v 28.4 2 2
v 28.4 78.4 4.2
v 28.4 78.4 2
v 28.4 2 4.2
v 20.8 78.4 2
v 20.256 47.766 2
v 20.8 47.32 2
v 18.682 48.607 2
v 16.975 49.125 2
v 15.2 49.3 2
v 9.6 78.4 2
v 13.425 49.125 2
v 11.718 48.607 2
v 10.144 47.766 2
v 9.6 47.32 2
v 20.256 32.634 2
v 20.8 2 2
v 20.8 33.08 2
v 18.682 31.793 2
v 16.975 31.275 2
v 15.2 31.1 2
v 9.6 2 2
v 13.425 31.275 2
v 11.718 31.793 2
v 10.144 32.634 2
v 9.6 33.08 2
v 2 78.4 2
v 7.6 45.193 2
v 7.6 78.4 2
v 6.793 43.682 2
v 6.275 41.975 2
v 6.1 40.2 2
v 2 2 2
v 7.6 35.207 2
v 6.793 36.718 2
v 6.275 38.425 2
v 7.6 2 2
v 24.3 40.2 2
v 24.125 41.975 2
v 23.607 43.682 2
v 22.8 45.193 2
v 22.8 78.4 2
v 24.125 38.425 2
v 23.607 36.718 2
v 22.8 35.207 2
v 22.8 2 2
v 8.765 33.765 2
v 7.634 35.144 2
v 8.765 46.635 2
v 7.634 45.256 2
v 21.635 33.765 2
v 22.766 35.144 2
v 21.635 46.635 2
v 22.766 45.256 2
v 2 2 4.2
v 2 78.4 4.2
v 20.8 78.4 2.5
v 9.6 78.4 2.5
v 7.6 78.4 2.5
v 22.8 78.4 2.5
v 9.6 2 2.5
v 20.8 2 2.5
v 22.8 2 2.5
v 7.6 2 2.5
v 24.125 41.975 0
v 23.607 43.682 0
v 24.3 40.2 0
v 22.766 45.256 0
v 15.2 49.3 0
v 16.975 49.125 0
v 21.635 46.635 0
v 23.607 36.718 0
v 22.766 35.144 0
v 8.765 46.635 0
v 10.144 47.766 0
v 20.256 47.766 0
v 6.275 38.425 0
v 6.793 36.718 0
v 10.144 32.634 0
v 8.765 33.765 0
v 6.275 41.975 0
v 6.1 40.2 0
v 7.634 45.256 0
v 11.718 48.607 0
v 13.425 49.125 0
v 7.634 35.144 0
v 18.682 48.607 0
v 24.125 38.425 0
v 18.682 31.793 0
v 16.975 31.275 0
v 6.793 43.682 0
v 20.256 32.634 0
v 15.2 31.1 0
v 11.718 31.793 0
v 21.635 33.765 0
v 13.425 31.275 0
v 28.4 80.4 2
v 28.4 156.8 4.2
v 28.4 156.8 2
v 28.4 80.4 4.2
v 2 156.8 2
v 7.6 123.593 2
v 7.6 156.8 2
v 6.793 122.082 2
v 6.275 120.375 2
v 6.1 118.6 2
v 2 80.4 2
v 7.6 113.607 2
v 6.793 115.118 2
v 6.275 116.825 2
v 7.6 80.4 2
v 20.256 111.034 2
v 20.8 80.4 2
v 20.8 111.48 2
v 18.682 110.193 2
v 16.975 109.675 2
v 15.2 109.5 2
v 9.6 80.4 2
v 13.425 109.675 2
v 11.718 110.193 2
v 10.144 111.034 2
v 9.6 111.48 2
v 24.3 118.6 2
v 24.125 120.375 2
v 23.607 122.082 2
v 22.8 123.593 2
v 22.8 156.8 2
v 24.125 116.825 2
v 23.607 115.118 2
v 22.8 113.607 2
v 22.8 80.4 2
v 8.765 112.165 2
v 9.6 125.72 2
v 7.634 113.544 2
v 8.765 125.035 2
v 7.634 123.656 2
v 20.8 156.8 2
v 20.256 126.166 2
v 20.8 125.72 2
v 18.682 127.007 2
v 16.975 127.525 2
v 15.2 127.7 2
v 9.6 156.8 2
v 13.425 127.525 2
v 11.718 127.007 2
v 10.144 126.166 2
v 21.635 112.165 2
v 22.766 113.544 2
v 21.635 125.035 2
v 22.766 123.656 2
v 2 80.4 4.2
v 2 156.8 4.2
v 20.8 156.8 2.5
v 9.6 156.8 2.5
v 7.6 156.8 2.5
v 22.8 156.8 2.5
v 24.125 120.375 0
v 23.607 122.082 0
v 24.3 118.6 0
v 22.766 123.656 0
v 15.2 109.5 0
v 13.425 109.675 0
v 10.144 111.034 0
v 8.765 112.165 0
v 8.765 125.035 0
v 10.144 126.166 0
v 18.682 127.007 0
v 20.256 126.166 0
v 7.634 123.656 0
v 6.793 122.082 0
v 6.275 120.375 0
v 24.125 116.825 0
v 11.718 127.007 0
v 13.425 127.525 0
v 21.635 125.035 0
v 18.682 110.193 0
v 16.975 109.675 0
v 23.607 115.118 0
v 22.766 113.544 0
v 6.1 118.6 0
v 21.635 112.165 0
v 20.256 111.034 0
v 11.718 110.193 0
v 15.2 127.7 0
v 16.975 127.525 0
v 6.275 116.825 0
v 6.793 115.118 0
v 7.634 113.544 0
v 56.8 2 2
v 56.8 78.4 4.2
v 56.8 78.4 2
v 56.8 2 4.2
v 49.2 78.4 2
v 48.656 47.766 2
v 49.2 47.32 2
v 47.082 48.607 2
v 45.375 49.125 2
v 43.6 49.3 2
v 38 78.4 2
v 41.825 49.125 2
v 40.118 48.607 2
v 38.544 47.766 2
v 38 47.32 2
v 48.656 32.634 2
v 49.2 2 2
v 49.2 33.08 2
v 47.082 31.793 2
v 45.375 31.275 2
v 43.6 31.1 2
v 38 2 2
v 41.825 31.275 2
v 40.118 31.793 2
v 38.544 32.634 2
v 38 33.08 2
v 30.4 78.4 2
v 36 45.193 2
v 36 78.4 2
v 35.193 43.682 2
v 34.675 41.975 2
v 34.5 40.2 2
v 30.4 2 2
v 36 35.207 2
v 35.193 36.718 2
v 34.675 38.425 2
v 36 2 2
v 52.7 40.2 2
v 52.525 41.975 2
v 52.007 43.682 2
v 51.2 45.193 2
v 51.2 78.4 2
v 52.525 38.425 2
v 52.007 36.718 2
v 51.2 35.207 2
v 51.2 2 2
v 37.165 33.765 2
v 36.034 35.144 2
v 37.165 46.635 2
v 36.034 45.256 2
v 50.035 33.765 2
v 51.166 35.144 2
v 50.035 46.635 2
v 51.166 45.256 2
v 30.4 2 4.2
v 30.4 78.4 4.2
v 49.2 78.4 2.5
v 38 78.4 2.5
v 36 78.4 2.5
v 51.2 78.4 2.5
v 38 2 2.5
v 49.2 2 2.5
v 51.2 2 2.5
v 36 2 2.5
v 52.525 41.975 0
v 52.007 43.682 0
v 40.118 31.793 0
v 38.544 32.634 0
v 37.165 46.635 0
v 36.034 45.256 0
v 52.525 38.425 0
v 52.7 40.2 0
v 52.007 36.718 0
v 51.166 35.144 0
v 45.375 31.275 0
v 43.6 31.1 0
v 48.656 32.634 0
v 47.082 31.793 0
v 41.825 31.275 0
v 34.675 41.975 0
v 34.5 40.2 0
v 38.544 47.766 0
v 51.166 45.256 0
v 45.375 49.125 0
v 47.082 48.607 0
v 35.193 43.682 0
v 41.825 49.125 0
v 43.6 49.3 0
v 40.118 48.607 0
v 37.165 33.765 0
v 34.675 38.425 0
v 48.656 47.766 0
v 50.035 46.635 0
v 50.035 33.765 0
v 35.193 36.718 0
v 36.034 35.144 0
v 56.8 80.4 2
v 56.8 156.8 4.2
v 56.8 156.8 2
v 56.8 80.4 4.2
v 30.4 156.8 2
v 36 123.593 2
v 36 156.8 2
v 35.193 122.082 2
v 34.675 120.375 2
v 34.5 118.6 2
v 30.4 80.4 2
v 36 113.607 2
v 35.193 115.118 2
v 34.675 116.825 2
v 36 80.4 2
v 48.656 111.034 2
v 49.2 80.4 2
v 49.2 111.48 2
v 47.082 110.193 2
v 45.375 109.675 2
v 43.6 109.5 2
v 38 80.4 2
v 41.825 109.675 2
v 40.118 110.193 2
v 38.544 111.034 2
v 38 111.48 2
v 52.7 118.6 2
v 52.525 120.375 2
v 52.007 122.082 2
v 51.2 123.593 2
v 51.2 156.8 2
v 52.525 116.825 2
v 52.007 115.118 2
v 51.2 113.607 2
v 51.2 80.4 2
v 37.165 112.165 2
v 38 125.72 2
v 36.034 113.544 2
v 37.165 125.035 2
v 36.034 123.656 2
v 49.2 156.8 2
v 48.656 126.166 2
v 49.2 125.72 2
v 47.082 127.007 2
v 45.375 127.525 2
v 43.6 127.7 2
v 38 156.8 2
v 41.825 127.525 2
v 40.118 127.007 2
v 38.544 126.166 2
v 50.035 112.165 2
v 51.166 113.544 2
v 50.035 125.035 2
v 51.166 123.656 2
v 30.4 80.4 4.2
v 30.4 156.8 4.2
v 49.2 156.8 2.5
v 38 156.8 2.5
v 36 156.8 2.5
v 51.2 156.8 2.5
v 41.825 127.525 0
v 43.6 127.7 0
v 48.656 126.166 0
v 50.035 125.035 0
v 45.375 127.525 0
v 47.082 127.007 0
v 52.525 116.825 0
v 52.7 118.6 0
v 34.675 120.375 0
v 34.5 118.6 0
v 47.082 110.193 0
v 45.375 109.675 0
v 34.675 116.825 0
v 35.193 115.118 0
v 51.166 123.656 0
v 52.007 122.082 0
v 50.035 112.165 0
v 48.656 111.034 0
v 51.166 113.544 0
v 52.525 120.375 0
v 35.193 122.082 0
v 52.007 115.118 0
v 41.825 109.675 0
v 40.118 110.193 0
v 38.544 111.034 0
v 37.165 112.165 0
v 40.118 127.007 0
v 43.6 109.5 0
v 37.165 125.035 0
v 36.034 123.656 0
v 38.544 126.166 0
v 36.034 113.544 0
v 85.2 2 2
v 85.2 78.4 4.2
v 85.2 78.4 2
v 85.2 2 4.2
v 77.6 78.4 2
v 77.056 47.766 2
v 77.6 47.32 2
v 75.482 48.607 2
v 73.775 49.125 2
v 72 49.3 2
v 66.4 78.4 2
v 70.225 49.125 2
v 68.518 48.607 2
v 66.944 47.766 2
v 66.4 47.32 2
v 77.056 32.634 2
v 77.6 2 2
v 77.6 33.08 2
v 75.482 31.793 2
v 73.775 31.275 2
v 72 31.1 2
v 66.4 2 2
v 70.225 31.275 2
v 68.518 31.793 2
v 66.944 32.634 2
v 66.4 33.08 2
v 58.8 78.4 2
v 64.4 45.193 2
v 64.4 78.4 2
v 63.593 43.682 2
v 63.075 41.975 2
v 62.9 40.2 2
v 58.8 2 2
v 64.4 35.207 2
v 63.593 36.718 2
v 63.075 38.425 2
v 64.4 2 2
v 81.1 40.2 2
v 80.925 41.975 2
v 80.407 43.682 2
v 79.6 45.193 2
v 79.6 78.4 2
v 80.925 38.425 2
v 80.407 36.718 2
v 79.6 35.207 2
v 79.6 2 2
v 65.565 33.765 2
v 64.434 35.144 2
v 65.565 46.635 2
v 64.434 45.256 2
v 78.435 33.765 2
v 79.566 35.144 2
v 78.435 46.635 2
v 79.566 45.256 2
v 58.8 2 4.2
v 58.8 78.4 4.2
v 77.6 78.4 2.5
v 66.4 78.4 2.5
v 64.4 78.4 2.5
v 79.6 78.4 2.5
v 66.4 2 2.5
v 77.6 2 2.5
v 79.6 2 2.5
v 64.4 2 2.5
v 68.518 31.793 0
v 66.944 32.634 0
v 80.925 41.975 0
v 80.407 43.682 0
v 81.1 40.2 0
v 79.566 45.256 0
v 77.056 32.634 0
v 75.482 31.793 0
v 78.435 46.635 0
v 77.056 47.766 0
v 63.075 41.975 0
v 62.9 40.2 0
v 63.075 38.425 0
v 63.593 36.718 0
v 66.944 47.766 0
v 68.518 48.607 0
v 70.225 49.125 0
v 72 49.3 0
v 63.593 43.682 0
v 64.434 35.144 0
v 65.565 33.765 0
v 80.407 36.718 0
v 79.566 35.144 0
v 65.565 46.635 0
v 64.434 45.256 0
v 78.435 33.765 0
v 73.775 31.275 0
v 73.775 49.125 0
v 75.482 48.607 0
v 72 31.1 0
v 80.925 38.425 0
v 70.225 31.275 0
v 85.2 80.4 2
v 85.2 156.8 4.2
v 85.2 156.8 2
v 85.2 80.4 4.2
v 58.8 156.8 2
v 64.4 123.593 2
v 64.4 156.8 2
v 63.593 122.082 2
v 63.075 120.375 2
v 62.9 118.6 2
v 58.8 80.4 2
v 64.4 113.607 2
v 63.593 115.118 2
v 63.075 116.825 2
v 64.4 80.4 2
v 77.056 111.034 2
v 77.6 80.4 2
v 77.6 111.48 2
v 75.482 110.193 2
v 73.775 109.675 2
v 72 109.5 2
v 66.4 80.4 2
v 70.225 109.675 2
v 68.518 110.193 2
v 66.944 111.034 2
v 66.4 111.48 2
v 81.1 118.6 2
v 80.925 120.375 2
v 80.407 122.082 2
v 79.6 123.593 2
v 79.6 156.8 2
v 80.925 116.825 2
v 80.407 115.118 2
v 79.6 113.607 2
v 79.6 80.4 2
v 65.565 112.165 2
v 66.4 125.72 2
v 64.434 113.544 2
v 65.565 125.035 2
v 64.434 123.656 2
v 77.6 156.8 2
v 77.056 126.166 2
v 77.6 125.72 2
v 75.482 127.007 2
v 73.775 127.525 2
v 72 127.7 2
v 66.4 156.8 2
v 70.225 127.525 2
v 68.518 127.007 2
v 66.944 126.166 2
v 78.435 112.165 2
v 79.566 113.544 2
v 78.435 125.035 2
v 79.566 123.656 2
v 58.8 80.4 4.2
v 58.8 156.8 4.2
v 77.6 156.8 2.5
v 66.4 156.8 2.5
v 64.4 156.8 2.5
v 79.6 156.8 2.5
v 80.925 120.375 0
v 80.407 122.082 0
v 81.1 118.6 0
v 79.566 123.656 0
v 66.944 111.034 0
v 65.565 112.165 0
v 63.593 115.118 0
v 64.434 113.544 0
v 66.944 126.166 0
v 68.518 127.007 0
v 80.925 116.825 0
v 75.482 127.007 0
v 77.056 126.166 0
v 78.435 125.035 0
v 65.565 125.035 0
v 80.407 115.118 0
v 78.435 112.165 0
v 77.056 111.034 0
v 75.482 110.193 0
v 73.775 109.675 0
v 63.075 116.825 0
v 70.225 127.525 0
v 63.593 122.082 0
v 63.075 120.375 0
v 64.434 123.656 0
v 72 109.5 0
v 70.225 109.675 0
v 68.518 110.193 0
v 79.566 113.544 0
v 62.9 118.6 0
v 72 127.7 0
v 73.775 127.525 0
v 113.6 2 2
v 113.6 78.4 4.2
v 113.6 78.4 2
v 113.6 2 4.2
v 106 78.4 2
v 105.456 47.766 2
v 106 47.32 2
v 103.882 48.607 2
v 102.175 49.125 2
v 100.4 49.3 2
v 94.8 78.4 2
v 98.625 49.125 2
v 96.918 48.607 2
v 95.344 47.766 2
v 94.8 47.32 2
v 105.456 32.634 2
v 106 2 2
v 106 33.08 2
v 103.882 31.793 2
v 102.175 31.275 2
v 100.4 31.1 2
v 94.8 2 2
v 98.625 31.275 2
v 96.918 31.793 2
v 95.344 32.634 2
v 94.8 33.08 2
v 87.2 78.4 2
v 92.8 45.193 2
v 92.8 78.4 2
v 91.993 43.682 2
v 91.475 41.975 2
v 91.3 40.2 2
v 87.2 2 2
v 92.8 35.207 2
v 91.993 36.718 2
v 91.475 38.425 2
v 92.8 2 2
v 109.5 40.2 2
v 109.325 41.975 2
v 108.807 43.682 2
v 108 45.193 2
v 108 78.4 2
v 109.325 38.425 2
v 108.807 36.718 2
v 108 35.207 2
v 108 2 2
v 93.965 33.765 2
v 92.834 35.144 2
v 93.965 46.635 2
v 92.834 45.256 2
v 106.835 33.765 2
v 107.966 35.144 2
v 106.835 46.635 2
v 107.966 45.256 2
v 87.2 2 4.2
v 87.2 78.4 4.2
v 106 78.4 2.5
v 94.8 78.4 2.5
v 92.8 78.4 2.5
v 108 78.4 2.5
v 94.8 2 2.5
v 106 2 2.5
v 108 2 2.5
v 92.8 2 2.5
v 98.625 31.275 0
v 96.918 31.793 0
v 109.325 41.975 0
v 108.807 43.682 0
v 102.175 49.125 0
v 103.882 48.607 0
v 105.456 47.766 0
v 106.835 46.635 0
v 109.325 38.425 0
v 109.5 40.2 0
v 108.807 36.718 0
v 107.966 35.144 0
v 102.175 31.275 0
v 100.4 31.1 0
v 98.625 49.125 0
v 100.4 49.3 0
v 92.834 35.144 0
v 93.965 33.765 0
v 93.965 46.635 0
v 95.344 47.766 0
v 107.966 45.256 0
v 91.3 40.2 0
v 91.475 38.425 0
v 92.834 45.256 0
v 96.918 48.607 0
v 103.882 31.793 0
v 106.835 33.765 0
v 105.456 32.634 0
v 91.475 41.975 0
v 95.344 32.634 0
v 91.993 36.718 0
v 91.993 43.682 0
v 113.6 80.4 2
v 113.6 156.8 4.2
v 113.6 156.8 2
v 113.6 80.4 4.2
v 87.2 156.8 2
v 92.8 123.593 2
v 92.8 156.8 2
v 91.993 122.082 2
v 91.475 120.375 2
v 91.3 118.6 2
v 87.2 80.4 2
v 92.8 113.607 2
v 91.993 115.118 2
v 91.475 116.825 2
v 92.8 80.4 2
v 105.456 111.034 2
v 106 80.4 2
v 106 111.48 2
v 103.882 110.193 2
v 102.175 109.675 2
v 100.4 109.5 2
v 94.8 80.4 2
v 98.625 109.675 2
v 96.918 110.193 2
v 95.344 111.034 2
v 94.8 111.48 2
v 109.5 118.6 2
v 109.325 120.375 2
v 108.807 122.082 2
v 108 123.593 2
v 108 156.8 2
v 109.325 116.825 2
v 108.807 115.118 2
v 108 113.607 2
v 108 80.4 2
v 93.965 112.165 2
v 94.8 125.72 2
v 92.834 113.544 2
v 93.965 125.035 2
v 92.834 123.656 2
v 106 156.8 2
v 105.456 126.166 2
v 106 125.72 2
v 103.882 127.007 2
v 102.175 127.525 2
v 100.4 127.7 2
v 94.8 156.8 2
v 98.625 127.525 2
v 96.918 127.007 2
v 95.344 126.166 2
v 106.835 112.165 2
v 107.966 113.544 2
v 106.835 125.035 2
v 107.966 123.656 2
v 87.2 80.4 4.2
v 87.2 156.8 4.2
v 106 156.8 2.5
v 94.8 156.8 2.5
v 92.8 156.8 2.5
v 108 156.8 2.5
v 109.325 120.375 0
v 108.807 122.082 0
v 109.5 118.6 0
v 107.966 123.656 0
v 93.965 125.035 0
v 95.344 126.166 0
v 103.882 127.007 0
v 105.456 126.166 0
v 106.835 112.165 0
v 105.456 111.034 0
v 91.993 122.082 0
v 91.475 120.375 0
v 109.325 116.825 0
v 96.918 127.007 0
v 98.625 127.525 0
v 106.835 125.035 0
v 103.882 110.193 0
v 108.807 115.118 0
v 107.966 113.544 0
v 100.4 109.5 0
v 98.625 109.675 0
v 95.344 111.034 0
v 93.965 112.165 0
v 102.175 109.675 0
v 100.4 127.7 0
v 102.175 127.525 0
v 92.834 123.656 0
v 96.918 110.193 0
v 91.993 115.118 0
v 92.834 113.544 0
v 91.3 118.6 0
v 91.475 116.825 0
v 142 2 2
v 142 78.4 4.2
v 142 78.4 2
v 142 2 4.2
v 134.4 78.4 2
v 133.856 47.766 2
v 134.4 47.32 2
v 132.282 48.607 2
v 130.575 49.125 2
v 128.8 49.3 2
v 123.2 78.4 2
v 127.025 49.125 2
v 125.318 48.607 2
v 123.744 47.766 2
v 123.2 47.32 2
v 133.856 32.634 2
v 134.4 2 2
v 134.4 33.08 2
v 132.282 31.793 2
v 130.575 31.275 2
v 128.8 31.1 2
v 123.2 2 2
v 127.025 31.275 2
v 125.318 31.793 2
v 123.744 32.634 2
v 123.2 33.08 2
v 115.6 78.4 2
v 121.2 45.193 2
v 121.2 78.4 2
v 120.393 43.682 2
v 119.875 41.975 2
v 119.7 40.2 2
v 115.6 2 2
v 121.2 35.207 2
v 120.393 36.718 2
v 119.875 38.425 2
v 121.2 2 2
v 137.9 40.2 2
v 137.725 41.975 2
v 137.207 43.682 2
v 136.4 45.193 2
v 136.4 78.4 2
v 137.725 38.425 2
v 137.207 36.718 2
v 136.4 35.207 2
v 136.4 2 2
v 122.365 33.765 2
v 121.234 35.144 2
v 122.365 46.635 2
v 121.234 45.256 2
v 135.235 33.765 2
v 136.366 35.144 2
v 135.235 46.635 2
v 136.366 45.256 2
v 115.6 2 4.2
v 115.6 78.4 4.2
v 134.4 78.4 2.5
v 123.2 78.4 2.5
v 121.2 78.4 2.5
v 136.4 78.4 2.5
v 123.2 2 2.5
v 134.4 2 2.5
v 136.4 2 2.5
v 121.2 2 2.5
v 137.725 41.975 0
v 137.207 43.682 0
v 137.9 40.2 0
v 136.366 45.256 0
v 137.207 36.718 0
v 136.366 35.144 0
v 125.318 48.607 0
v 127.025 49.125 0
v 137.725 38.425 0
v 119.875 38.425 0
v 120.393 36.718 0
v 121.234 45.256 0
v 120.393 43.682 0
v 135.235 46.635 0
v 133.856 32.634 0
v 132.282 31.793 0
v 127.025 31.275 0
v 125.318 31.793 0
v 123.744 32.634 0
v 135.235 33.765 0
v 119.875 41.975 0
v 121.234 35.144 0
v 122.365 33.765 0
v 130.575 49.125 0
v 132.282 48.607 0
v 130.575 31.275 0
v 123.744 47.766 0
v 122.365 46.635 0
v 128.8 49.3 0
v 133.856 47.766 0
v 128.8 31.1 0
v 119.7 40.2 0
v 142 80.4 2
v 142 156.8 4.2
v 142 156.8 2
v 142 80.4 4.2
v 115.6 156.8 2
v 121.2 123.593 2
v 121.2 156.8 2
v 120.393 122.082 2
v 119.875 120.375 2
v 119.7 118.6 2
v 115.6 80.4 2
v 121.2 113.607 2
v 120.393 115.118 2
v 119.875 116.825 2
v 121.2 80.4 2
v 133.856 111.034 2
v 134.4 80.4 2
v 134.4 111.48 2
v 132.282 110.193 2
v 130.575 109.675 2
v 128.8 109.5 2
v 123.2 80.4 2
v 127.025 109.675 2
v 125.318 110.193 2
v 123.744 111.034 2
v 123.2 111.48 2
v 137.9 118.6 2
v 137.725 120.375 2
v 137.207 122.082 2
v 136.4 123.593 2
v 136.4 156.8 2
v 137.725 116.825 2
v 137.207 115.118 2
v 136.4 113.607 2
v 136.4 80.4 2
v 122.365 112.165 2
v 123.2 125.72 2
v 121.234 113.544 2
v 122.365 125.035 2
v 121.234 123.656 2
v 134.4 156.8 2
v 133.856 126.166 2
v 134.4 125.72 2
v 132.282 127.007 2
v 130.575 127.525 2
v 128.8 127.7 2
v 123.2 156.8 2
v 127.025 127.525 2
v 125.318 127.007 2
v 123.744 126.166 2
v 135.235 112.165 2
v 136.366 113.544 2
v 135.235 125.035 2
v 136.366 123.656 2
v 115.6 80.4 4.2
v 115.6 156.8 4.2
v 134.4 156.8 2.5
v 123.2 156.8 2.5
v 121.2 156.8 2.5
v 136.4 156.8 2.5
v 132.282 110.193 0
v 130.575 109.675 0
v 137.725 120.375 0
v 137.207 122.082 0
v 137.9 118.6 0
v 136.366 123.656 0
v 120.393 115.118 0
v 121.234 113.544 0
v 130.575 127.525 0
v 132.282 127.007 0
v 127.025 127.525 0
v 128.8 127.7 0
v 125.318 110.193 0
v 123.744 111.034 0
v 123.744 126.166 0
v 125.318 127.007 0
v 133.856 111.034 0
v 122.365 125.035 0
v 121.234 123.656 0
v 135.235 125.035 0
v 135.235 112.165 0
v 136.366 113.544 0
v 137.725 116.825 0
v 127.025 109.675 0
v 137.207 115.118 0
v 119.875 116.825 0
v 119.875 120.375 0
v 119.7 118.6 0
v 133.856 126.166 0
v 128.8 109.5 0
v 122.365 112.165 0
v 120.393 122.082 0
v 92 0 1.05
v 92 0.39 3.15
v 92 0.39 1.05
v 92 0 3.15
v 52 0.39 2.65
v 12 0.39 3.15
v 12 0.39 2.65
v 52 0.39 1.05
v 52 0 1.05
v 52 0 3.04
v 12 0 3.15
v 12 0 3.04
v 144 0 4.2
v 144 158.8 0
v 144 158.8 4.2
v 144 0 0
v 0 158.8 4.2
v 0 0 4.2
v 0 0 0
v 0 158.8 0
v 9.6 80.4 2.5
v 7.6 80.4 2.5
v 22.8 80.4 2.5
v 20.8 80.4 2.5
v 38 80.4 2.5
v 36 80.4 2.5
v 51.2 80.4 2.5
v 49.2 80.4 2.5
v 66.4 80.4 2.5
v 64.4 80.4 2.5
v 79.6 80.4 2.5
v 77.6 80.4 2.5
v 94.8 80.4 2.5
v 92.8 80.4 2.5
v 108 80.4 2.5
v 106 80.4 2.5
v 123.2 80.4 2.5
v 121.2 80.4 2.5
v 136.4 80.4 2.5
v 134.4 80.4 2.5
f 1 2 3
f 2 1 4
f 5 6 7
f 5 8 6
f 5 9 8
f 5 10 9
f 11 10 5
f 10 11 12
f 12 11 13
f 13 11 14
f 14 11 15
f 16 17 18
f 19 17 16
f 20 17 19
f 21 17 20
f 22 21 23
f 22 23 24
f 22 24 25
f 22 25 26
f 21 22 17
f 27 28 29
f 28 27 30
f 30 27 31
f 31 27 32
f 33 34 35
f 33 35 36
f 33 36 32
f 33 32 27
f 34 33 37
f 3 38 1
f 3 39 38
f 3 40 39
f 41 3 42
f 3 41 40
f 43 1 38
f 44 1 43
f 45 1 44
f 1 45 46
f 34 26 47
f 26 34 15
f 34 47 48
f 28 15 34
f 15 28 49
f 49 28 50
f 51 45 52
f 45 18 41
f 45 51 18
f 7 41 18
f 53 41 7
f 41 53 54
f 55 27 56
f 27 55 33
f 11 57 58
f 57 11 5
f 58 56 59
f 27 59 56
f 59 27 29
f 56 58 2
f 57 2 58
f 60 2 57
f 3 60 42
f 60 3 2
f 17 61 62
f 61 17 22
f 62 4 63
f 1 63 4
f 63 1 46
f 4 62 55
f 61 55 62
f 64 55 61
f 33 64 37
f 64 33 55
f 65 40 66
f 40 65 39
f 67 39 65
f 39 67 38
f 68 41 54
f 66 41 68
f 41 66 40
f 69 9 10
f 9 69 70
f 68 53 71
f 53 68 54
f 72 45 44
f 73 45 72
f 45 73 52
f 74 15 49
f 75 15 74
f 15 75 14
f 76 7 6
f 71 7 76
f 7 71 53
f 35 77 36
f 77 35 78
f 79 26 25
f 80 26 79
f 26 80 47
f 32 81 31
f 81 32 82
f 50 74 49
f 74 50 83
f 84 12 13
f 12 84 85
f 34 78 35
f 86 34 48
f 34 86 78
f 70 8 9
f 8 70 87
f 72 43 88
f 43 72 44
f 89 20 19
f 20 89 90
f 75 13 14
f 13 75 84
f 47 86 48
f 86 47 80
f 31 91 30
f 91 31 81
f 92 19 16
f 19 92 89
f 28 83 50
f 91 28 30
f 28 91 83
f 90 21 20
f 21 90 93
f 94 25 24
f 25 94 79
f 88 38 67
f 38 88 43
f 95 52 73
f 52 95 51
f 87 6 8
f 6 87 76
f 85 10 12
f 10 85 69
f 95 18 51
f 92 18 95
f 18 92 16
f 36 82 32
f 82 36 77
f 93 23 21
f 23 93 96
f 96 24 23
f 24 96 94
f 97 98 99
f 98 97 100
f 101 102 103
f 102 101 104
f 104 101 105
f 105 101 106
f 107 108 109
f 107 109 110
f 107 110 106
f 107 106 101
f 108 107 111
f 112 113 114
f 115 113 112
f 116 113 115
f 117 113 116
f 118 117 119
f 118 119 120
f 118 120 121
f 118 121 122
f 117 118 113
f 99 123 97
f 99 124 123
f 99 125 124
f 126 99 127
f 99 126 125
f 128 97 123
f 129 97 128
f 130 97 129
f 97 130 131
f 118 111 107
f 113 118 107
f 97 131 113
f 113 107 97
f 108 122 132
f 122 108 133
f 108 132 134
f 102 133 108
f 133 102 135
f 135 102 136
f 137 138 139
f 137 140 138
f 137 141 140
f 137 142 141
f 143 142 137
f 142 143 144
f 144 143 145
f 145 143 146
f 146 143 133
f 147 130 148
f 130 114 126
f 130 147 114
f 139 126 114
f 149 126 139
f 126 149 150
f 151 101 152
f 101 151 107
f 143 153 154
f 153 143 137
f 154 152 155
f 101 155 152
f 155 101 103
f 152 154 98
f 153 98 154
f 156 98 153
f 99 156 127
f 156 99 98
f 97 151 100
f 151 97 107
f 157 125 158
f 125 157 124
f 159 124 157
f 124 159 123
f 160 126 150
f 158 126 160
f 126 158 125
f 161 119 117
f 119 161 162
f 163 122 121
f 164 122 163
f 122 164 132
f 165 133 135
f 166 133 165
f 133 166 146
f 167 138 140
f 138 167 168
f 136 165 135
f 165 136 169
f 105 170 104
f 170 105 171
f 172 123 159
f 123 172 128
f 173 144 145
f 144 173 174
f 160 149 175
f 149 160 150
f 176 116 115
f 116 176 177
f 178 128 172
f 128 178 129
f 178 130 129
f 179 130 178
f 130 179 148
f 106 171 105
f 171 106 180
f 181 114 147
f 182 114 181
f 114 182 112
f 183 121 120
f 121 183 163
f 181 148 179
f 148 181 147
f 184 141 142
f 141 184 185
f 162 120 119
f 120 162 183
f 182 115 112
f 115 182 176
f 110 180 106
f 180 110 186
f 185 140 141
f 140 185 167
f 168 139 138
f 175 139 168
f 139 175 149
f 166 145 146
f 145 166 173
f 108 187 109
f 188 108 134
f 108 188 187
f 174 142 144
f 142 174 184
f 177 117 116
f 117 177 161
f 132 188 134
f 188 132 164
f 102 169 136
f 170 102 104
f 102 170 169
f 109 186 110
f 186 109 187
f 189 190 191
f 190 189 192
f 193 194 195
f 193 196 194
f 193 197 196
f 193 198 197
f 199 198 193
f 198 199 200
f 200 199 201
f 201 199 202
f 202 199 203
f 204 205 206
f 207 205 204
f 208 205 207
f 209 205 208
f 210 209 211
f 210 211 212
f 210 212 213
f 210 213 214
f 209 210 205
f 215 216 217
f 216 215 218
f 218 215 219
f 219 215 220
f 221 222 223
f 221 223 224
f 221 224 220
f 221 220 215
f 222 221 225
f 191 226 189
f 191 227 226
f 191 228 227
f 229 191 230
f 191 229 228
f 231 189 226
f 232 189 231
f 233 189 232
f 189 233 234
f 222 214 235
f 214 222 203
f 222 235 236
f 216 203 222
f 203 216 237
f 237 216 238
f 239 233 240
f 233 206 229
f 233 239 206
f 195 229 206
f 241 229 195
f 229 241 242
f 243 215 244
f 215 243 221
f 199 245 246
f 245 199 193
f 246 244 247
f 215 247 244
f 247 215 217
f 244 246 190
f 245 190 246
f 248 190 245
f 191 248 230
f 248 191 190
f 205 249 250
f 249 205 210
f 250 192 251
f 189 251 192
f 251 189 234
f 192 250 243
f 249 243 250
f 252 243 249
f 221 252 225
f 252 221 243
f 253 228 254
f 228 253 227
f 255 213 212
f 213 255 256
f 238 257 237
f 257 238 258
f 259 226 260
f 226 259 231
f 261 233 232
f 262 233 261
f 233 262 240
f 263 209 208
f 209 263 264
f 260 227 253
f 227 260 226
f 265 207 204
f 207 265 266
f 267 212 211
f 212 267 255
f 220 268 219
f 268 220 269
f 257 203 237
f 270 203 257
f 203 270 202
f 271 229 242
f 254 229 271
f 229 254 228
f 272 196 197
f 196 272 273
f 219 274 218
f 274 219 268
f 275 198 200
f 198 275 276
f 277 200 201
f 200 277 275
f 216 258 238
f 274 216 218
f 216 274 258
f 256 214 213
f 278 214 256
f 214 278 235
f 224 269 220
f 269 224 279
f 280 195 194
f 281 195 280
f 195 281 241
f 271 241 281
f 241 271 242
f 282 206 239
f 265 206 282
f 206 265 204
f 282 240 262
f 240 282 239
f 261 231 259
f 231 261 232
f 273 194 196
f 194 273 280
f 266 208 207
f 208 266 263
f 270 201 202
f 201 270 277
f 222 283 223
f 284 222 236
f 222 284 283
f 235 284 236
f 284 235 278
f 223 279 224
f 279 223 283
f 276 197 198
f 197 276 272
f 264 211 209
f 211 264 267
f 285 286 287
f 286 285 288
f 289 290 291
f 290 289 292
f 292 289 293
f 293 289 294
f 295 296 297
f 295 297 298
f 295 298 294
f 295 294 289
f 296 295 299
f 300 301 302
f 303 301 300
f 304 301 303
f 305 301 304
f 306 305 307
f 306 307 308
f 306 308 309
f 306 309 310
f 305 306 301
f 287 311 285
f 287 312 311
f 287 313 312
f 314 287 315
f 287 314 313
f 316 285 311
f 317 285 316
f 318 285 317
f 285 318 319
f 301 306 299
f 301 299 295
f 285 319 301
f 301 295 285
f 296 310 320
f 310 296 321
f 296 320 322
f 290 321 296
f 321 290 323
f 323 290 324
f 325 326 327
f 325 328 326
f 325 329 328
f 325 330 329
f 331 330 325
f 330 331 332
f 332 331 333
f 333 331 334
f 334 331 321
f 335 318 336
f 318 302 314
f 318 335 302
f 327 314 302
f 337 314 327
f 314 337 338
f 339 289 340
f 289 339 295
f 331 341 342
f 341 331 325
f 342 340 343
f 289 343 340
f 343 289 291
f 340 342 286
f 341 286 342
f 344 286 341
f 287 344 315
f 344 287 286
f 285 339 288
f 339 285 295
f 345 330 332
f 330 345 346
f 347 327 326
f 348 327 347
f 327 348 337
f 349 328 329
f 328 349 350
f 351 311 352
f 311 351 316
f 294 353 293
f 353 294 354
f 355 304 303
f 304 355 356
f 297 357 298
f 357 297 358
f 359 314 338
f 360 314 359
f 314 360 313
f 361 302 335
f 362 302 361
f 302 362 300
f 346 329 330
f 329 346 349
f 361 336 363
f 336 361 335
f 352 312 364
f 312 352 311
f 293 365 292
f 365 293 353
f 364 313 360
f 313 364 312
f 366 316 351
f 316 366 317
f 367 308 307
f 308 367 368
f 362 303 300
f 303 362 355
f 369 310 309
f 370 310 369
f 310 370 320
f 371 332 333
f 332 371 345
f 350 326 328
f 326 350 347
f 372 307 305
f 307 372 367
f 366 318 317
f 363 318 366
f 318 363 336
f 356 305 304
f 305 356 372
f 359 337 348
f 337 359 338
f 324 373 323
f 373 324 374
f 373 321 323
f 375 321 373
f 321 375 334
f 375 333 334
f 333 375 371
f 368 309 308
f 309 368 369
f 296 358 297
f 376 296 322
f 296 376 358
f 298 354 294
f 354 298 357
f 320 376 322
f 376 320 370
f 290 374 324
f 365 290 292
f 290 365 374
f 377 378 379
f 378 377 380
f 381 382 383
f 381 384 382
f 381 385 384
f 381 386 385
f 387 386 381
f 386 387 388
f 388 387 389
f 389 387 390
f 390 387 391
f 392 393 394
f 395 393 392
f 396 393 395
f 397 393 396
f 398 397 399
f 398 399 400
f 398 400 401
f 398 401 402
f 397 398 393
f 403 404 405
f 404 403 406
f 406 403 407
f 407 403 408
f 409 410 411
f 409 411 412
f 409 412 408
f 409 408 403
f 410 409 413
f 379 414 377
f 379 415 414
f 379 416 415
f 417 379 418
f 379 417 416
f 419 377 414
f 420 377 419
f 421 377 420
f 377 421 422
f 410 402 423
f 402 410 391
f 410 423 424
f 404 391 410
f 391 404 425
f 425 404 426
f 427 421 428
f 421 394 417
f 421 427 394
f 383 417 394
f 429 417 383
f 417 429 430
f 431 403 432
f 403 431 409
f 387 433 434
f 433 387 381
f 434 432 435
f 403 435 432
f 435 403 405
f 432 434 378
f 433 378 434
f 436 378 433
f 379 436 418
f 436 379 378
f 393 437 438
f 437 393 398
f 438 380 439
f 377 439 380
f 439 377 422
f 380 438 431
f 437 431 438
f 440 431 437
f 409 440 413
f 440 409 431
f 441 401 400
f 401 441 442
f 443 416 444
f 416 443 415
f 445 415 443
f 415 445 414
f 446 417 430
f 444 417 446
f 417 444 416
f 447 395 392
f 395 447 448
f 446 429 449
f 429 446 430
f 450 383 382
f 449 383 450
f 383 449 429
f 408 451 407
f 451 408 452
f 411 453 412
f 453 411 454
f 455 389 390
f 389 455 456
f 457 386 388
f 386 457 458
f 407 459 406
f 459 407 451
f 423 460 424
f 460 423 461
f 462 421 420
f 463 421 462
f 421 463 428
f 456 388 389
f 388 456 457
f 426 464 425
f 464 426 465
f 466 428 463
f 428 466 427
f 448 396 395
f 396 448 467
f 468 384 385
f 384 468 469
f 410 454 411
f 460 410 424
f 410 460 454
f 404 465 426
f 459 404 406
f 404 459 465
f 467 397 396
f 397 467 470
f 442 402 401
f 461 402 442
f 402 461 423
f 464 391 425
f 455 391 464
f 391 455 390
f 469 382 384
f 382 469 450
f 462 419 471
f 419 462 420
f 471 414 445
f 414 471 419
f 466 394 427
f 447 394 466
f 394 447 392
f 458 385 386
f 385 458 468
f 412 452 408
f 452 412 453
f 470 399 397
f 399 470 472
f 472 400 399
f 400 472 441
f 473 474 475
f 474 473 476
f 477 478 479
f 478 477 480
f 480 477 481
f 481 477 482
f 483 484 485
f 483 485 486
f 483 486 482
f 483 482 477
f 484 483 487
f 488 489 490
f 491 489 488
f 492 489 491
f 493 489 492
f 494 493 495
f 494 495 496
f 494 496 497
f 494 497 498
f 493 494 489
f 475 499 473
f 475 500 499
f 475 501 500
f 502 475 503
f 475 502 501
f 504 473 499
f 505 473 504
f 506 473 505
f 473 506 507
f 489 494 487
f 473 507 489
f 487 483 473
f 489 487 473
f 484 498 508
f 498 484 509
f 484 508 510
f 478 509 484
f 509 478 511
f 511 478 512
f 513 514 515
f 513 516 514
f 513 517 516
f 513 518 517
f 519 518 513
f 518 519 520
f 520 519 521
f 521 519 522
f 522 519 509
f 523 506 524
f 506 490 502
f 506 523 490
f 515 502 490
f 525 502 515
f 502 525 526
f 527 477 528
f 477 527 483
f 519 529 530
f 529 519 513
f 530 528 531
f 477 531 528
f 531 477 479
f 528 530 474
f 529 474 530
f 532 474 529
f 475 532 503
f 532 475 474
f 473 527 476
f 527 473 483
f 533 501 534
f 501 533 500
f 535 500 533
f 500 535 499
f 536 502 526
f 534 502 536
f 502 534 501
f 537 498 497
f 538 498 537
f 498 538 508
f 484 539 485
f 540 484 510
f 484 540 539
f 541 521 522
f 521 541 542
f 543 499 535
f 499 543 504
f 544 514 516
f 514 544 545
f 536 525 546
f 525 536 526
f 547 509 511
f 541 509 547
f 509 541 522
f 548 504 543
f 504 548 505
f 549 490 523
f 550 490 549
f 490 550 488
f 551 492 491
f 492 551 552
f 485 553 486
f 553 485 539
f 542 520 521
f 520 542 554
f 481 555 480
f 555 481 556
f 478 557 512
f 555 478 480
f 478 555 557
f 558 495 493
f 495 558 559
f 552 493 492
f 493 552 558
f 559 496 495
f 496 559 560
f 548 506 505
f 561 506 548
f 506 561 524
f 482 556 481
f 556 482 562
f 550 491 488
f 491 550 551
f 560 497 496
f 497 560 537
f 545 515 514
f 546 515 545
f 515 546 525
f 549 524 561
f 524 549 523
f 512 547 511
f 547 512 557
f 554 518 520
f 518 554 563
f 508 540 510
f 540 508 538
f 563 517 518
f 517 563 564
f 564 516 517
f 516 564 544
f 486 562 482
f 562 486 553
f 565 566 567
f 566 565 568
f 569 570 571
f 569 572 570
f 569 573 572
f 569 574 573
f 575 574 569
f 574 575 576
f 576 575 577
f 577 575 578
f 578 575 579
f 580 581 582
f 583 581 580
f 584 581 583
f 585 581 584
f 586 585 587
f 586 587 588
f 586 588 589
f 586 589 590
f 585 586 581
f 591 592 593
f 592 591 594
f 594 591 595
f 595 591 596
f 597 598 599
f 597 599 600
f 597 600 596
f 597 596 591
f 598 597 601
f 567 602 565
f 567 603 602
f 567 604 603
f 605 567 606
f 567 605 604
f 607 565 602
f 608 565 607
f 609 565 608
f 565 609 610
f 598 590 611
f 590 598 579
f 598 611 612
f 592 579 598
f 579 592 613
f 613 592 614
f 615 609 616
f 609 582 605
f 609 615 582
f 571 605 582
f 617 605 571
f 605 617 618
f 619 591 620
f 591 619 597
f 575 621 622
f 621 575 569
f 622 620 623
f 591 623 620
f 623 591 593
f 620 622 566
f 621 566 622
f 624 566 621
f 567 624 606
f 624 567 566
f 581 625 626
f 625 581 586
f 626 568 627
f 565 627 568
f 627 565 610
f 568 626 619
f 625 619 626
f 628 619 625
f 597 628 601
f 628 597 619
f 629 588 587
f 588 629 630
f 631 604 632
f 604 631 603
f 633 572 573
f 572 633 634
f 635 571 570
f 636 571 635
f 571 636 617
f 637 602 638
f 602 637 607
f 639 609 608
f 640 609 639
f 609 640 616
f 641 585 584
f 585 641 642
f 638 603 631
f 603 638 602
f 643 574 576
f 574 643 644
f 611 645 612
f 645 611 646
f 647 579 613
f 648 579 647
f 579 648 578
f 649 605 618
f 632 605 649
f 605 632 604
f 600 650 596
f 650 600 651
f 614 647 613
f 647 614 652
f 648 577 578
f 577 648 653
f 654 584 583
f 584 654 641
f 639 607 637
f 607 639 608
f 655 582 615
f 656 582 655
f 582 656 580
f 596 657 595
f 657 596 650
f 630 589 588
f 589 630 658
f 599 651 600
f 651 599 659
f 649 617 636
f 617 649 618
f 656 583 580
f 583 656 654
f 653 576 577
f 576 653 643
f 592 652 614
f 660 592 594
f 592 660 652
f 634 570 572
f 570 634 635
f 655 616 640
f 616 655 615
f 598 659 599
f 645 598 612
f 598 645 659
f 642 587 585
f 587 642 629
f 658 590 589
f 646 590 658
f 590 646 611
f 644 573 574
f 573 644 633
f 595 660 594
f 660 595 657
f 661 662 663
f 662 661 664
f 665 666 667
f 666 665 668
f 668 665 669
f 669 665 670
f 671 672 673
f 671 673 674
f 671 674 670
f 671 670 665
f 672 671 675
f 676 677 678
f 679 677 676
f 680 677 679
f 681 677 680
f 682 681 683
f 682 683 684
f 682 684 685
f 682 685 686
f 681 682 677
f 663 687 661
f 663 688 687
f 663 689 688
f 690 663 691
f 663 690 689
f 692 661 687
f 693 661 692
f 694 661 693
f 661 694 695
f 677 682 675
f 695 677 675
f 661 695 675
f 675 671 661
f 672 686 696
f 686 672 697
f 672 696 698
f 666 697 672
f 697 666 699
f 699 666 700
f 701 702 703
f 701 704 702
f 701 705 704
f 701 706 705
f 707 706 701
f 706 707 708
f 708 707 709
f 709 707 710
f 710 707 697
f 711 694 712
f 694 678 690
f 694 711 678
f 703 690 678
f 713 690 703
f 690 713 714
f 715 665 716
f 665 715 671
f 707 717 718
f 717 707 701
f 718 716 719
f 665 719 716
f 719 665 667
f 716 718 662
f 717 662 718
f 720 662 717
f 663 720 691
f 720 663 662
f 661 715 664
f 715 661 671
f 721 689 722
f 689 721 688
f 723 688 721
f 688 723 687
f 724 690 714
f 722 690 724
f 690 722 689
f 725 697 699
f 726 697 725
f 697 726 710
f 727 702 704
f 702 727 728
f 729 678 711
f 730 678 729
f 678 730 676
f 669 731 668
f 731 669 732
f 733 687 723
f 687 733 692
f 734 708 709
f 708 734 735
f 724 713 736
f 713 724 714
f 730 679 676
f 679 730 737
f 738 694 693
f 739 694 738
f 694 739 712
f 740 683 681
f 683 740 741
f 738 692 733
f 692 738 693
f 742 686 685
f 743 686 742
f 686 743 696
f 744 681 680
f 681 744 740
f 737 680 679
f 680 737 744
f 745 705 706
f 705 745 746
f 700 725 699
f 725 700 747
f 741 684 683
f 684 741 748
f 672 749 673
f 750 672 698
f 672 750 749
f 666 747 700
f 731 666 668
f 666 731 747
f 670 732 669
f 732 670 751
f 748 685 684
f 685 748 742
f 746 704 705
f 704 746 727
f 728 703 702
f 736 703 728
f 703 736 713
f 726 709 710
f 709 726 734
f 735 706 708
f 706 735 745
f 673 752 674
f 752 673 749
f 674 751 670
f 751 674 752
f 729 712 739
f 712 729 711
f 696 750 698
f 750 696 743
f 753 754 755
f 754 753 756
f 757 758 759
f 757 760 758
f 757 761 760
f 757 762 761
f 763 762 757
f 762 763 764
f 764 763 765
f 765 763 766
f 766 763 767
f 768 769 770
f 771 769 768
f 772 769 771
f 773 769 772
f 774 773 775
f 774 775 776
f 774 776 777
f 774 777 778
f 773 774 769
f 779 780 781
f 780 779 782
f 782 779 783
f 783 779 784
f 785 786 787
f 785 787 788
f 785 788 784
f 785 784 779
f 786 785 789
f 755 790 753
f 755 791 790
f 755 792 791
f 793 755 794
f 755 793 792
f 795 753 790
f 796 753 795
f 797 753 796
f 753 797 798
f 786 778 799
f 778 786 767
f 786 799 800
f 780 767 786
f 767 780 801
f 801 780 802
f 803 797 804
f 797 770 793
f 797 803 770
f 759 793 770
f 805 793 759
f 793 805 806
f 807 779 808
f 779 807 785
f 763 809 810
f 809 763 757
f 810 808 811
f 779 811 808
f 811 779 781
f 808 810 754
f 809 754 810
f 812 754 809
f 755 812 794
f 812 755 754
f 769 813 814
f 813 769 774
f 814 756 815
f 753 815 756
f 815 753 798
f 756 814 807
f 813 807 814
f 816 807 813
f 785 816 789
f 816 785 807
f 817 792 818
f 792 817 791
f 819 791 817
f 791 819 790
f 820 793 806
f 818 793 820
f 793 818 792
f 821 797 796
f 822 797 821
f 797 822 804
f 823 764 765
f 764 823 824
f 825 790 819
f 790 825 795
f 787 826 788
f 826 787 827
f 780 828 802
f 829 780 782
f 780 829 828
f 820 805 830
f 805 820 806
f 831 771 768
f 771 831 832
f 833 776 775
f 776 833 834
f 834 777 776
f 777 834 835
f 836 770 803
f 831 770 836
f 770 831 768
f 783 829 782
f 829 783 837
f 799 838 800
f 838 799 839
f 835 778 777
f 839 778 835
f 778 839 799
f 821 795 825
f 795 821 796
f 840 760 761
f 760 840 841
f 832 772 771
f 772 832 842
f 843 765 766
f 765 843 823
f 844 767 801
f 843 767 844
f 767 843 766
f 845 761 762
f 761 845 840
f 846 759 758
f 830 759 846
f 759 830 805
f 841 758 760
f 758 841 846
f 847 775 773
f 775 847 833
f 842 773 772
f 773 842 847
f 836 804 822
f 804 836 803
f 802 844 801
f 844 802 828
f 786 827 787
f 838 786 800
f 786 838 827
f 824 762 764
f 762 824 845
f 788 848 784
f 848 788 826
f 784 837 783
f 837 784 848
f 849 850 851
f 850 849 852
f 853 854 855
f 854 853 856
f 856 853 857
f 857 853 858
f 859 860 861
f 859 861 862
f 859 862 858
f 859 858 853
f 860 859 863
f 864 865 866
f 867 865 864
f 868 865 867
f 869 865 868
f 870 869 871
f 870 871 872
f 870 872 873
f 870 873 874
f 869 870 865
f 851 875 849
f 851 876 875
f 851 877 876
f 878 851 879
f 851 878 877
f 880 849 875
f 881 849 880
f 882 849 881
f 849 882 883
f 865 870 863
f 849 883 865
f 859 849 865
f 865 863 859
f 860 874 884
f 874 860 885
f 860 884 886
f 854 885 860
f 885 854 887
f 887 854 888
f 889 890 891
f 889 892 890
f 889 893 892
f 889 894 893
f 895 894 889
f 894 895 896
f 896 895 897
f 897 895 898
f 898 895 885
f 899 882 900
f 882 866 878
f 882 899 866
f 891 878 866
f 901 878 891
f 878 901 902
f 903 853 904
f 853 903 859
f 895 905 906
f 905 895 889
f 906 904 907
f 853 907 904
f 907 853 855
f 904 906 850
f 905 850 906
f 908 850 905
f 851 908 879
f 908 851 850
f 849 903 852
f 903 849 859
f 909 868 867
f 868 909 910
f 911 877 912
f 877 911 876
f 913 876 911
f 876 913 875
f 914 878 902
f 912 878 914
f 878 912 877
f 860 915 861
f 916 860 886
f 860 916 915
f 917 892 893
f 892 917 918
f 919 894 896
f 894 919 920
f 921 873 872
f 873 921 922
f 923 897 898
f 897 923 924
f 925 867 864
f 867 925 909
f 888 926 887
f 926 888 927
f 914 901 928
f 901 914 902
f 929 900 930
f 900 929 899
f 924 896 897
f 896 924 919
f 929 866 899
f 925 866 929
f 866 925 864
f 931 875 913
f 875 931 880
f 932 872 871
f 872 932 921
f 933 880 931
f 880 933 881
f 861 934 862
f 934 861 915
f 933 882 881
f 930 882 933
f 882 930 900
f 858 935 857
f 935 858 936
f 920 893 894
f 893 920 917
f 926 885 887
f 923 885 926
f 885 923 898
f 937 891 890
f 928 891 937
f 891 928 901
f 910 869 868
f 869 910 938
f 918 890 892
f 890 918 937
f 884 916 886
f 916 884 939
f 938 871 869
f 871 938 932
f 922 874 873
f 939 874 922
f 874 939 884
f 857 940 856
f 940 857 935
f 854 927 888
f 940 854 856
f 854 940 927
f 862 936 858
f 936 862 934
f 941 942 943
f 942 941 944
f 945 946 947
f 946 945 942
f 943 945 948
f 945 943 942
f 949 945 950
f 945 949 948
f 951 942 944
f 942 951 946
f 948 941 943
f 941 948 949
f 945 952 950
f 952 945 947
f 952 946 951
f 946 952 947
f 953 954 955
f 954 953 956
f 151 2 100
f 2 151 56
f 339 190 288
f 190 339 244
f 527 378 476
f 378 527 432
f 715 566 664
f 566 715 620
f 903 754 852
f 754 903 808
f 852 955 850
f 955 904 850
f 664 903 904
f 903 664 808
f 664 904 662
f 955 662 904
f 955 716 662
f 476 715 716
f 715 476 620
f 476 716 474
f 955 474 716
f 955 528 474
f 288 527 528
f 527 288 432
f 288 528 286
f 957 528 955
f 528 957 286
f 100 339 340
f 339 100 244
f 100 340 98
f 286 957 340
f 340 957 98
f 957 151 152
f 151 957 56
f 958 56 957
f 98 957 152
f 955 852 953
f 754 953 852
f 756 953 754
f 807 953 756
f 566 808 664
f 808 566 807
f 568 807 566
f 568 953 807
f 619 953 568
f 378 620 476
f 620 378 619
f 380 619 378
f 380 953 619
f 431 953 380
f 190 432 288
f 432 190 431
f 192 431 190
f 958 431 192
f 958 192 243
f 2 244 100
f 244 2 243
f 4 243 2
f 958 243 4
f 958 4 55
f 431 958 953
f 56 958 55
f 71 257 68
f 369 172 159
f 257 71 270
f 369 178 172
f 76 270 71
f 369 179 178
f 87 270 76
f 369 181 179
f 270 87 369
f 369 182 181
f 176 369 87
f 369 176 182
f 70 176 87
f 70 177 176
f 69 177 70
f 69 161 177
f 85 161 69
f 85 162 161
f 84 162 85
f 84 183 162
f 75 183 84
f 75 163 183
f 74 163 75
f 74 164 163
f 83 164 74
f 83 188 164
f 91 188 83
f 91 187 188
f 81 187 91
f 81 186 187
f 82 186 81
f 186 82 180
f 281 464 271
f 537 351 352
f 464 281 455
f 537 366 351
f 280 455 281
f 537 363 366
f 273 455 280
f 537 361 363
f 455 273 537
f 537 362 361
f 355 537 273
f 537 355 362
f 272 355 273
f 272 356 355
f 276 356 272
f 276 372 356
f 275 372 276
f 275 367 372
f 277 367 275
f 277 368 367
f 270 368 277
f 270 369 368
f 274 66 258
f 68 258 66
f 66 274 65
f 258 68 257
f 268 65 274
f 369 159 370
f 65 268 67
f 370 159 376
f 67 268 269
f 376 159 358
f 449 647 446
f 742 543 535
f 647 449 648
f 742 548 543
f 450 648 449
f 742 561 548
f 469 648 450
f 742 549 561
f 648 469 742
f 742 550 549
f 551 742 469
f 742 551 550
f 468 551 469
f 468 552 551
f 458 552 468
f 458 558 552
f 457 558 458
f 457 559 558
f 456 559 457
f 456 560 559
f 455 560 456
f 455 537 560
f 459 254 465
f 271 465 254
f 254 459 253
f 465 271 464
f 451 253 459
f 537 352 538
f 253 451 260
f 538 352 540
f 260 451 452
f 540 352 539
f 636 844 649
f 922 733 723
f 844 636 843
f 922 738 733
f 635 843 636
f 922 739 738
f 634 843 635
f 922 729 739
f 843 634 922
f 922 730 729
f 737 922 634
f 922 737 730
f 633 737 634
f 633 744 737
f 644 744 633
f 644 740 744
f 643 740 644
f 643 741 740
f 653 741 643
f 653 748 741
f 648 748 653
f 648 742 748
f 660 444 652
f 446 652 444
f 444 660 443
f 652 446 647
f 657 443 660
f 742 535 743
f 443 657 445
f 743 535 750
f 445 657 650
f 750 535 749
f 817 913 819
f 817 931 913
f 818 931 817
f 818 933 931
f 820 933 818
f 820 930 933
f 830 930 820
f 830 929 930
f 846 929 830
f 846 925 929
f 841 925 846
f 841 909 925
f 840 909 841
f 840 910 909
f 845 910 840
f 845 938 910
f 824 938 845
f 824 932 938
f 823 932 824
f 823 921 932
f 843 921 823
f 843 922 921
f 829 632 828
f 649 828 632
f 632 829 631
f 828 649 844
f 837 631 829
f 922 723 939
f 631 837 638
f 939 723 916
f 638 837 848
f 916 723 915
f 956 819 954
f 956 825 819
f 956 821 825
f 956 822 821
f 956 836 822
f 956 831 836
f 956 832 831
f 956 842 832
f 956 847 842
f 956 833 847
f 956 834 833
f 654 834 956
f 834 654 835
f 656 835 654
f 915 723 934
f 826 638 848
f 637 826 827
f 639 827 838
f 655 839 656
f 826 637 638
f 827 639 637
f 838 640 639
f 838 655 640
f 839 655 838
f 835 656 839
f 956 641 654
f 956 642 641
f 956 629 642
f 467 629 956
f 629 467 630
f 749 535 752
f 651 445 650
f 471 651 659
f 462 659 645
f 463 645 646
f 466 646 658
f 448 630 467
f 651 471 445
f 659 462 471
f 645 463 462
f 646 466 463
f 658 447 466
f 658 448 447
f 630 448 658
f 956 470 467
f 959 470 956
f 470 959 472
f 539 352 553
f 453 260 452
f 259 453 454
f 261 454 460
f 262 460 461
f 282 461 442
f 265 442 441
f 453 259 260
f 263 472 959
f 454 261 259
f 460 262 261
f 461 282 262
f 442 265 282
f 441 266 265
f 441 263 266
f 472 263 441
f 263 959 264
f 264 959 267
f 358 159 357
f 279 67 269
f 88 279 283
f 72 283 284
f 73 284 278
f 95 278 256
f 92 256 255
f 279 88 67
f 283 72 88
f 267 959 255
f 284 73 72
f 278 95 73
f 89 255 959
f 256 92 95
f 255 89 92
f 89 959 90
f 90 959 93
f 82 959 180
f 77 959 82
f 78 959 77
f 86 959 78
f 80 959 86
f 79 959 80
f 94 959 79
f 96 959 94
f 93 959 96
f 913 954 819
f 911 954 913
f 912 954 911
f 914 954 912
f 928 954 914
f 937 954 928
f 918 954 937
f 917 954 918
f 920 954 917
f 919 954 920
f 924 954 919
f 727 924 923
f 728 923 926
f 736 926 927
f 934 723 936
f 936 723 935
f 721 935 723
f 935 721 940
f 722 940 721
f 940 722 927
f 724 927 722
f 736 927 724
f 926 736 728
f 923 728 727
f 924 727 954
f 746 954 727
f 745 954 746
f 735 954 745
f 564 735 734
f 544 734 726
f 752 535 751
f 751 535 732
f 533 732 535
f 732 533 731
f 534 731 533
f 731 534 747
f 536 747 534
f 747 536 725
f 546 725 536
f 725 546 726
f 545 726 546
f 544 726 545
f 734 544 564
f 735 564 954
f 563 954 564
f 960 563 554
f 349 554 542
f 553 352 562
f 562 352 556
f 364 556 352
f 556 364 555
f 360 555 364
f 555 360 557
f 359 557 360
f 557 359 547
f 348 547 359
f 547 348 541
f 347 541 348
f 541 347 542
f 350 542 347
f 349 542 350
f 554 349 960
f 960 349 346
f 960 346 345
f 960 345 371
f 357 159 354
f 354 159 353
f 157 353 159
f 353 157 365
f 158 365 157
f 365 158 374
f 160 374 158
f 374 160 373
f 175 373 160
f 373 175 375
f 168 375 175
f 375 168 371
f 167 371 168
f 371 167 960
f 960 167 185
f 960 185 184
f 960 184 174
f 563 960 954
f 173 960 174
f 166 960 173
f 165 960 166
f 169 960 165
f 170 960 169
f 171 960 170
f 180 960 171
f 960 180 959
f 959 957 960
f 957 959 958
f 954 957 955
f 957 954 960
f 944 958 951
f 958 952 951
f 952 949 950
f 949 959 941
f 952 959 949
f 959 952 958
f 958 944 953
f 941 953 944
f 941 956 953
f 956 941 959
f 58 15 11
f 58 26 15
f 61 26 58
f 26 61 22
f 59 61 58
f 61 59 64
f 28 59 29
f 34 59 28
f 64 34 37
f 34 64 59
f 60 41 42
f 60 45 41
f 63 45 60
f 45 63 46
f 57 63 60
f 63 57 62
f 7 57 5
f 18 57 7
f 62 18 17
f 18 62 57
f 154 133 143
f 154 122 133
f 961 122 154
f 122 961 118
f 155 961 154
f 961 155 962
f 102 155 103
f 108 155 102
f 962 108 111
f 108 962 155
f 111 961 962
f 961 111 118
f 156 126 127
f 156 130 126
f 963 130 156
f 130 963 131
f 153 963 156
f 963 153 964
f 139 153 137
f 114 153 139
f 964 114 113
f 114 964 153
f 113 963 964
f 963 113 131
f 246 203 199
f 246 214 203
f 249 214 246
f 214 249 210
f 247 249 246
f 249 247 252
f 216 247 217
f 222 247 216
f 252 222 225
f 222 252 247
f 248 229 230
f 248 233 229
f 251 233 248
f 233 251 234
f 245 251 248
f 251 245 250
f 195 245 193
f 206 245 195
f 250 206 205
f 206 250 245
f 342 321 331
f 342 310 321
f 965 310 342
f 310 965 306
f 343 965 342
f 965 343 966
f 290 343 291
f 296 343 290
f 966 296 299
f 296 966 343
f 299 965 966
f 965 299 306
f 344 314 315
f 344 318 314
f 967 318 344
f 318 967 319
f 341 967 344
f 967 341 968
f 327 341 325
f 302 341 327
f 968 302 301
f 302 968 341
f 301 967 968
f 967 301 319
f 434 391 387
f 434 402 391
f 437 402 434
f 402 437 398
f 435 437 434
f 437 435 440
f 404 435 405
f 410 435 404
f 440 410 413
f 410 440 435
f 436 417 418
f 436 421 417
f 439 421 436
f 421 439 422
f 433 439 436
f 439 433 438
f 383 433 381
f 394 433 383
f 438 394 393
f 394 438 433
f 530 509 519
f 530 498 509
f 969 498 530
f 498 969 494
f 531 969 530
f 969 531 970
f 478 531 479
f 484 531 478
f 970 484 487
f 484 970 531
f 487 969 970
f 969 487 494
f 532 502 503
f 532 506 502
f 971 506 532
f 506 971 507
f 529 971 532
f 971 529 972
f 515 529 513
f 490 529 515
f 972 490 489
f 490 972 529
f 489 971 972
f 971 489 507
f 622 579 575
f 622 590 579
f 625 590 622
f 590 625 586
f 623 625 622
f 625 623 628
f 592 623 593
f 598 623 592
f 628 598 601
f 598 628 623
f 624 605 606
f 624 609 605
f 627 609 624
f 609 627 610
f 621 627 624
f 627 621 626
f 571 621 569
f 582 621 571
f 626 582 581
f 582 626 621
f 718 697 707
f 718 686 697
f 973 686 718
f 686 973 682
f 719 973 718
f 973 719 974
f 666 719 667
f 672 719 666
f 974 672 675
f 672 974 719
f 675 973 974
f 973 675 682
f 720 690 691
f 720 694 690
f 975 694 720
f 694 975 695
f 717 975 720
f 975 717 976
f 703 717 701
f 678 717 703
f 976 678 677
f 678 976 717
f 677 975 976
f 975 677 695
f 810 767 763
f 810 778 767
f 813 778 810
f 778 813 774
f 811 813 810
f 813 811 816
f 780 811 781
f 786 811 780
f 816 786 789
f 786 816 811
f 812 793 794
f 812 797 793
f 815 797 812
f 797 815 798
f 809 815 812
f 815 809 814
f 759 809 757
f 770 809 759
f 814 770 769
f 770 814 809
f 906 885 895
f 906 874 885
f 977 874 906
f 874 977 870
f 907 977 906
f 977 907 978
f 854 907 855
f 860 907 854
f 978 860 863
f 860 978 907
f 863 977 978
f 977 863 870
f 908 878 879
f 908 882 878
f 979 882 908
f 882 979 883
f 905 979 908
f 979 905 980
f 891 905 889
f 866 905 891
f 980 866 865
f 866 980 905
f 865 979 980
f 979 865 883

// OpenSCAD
// ============================================================================
// tray.scad — Class I: Horizontal Planar Tray
// ============================================================================
// Reference: docs/RESEARCH.pdf §3 (Horizontal Planar Systems)
//
// Flat tray with recessed pockets arranged in a grid. Each pocket holds one
// slide lying flat, with anti-capillary floor ribs to break vacuum seal and
// cylindrical finger notches for ergonomic removal.
//
// Parts:
//   render_mode 0 → tray
// ============================================================================

use <slide_lib.scad>

// ---------------------------------------------------------------------------
// Parameters (injected by platform via -D)
// ---------------------------------------------------------------------------

// --- Slide Standard ---
slide_standard = 0; // 0=ISO, 1=US, 2=Petrographic, 3=Supa Mega, 4=Custom
custom_slide_length = 76;
custom_slide_width = 26;
custom_slide_thickness = 1.0;

// --- Architecture ---
num_slots = 10; // Total slide count (rows x columns)

// --- Tolerances ---
tolerance_xy = 0.4; // XY clearance (mm)
tolerance_z = 0.2; // Z / thickness clearance (mm)

// --- Structure ---
wall_thickness = 2.0; // Outer wall thickness (mm)

// --- Tray-specific ---
tray_columns = 5; // Columns of slide pockets
tray_rows = 2; // Rows of slide pockets
finger_notch = 1; // 1=generate finger notch per pocket
anti_capillary = 1; // 1=generate anti-capillary floor ribs

// --- Features ---
label_area = 1; // 1=generate debossed label recess

// --- Quality ---
fn = 0; // Resolution ($fn), 0 = auto

// --- Mode ---
render_mode = 0; // 0=tray

// ---------------------------------------------------------------------------
// Resolution
// ---------------------------------------------------------------------------
$fn = fn > 0 ? fn : 32;

// ---------------------------------------------------------------------------
// Resolve Slide Dimensions
// ---------------------------------------------------------------------------
_slide = resolve_slide(
  slide_standard, custom_slide_length,
  custom_slide_width, custom_slide_thickness
);
_sl = _slide[0]; // slide length
_sw = _slide[1]; // slide width
_st = _slide[2]; // slide thickness

// ---------------------------------------------------------------------------
// Derived Dimensions (RESEARCH §3, §4.1, §4.2)
// ---------------------------------------------------------------------------

// Pocket dimensions: slide + tolerance + clearance
_pocket_l = _sl + tolerance_xy;
_pocket_w = _sw + tolerance_xy;
_pocket_d = _st + tolerance_z + 1.0; // depth: slide thickness + clearance + recess

// Spacing between pockets
_gap = wall_thickness;

// Finger notch (RESEARCH §4.2: 15-22mm width, extends below floor)
_finger_r = max(8, _sw * 0.35);

// Body envelope
_body_x = (tray_columns * (_pocket_w + _gap)) + _gap;
_body_y = (tray_rows * (_pocket_l + _gap)) + _gap;
_body_z = _pocket_d + wall_thickness;

// Anti-capillary rib height (RESEARCH §4.1: 0.5-1.0mm)
_acr_h = 0.5;

// ---------------------------------------------------------------------------
// tray — Flat tray with recessed pockets
// ---------------------------------------------------------------------------
module tray() {
  union() {
    difference() {
      // Solid base
      cube([_body_x, _body_y, _body_z]);

      // Pockets (grid of recesses)
      for (col = [0:tray_columns - 1]) {
        for (row = [0:tray_rows - 1]) {
          _px = _gap + col * (_pocket_w + _gap);
          _py = _gap + row * (_pocket_l + _gap);
          _pz = wall_thickness;

          // Pocket recess
          translate([_px, _py, _pz])
            cube([_pocket_w, _pocket_l, _pocket_d + 1]);

          // Finger notch (cylindrical cutout at center-front of pocket)
          if (finger_notch == 1) {
            translate([_px + _pocket_w / 2, _py + _pocket_l / 2, -0.01])
              finger_notch(radius=_finger_r, depth=_body_z + 0.02);
          }
        }
      }

      // Label recess on front face
      if (label_area == 1) {
        _label_w = min(40, _body_x * 0.5);
        _label_h = min(10, _body_z * 0.5);
        translate([(_body_x - _label_w) / 2, -0.01, (_body_z - _label_h) / 2])
          rotate([90, 0, 0])
            translate([0, 0, -0.4])
              label_recess(_label_w, _label_h, 0.5);
      }
    }

    // Anti-capillary ribs inside each pocket (RESEARCH §4.1)
    if (anti_capillary == 1) {
      for (col = [0:tray_columns - 1]) {
        for (row = [0:tray_rows - 1]) {
          _px = _gap + col * (_pocket_w + _gap);
          _py = _gap + row * (_pocket_l + _gap);
          _pz = wall_thickness;

          translate([_px, _py, _pz])
            anti_capillary_ribs(_pocket_l, _pocket_w, _acr_h);
        }
      }
    }
  }
}

// ---------------------------------------------------------------------------
// Render Mode Dispatch
// ---------------------------------------------------------------------------
if (render_mode == 0) {
  tray();
}
